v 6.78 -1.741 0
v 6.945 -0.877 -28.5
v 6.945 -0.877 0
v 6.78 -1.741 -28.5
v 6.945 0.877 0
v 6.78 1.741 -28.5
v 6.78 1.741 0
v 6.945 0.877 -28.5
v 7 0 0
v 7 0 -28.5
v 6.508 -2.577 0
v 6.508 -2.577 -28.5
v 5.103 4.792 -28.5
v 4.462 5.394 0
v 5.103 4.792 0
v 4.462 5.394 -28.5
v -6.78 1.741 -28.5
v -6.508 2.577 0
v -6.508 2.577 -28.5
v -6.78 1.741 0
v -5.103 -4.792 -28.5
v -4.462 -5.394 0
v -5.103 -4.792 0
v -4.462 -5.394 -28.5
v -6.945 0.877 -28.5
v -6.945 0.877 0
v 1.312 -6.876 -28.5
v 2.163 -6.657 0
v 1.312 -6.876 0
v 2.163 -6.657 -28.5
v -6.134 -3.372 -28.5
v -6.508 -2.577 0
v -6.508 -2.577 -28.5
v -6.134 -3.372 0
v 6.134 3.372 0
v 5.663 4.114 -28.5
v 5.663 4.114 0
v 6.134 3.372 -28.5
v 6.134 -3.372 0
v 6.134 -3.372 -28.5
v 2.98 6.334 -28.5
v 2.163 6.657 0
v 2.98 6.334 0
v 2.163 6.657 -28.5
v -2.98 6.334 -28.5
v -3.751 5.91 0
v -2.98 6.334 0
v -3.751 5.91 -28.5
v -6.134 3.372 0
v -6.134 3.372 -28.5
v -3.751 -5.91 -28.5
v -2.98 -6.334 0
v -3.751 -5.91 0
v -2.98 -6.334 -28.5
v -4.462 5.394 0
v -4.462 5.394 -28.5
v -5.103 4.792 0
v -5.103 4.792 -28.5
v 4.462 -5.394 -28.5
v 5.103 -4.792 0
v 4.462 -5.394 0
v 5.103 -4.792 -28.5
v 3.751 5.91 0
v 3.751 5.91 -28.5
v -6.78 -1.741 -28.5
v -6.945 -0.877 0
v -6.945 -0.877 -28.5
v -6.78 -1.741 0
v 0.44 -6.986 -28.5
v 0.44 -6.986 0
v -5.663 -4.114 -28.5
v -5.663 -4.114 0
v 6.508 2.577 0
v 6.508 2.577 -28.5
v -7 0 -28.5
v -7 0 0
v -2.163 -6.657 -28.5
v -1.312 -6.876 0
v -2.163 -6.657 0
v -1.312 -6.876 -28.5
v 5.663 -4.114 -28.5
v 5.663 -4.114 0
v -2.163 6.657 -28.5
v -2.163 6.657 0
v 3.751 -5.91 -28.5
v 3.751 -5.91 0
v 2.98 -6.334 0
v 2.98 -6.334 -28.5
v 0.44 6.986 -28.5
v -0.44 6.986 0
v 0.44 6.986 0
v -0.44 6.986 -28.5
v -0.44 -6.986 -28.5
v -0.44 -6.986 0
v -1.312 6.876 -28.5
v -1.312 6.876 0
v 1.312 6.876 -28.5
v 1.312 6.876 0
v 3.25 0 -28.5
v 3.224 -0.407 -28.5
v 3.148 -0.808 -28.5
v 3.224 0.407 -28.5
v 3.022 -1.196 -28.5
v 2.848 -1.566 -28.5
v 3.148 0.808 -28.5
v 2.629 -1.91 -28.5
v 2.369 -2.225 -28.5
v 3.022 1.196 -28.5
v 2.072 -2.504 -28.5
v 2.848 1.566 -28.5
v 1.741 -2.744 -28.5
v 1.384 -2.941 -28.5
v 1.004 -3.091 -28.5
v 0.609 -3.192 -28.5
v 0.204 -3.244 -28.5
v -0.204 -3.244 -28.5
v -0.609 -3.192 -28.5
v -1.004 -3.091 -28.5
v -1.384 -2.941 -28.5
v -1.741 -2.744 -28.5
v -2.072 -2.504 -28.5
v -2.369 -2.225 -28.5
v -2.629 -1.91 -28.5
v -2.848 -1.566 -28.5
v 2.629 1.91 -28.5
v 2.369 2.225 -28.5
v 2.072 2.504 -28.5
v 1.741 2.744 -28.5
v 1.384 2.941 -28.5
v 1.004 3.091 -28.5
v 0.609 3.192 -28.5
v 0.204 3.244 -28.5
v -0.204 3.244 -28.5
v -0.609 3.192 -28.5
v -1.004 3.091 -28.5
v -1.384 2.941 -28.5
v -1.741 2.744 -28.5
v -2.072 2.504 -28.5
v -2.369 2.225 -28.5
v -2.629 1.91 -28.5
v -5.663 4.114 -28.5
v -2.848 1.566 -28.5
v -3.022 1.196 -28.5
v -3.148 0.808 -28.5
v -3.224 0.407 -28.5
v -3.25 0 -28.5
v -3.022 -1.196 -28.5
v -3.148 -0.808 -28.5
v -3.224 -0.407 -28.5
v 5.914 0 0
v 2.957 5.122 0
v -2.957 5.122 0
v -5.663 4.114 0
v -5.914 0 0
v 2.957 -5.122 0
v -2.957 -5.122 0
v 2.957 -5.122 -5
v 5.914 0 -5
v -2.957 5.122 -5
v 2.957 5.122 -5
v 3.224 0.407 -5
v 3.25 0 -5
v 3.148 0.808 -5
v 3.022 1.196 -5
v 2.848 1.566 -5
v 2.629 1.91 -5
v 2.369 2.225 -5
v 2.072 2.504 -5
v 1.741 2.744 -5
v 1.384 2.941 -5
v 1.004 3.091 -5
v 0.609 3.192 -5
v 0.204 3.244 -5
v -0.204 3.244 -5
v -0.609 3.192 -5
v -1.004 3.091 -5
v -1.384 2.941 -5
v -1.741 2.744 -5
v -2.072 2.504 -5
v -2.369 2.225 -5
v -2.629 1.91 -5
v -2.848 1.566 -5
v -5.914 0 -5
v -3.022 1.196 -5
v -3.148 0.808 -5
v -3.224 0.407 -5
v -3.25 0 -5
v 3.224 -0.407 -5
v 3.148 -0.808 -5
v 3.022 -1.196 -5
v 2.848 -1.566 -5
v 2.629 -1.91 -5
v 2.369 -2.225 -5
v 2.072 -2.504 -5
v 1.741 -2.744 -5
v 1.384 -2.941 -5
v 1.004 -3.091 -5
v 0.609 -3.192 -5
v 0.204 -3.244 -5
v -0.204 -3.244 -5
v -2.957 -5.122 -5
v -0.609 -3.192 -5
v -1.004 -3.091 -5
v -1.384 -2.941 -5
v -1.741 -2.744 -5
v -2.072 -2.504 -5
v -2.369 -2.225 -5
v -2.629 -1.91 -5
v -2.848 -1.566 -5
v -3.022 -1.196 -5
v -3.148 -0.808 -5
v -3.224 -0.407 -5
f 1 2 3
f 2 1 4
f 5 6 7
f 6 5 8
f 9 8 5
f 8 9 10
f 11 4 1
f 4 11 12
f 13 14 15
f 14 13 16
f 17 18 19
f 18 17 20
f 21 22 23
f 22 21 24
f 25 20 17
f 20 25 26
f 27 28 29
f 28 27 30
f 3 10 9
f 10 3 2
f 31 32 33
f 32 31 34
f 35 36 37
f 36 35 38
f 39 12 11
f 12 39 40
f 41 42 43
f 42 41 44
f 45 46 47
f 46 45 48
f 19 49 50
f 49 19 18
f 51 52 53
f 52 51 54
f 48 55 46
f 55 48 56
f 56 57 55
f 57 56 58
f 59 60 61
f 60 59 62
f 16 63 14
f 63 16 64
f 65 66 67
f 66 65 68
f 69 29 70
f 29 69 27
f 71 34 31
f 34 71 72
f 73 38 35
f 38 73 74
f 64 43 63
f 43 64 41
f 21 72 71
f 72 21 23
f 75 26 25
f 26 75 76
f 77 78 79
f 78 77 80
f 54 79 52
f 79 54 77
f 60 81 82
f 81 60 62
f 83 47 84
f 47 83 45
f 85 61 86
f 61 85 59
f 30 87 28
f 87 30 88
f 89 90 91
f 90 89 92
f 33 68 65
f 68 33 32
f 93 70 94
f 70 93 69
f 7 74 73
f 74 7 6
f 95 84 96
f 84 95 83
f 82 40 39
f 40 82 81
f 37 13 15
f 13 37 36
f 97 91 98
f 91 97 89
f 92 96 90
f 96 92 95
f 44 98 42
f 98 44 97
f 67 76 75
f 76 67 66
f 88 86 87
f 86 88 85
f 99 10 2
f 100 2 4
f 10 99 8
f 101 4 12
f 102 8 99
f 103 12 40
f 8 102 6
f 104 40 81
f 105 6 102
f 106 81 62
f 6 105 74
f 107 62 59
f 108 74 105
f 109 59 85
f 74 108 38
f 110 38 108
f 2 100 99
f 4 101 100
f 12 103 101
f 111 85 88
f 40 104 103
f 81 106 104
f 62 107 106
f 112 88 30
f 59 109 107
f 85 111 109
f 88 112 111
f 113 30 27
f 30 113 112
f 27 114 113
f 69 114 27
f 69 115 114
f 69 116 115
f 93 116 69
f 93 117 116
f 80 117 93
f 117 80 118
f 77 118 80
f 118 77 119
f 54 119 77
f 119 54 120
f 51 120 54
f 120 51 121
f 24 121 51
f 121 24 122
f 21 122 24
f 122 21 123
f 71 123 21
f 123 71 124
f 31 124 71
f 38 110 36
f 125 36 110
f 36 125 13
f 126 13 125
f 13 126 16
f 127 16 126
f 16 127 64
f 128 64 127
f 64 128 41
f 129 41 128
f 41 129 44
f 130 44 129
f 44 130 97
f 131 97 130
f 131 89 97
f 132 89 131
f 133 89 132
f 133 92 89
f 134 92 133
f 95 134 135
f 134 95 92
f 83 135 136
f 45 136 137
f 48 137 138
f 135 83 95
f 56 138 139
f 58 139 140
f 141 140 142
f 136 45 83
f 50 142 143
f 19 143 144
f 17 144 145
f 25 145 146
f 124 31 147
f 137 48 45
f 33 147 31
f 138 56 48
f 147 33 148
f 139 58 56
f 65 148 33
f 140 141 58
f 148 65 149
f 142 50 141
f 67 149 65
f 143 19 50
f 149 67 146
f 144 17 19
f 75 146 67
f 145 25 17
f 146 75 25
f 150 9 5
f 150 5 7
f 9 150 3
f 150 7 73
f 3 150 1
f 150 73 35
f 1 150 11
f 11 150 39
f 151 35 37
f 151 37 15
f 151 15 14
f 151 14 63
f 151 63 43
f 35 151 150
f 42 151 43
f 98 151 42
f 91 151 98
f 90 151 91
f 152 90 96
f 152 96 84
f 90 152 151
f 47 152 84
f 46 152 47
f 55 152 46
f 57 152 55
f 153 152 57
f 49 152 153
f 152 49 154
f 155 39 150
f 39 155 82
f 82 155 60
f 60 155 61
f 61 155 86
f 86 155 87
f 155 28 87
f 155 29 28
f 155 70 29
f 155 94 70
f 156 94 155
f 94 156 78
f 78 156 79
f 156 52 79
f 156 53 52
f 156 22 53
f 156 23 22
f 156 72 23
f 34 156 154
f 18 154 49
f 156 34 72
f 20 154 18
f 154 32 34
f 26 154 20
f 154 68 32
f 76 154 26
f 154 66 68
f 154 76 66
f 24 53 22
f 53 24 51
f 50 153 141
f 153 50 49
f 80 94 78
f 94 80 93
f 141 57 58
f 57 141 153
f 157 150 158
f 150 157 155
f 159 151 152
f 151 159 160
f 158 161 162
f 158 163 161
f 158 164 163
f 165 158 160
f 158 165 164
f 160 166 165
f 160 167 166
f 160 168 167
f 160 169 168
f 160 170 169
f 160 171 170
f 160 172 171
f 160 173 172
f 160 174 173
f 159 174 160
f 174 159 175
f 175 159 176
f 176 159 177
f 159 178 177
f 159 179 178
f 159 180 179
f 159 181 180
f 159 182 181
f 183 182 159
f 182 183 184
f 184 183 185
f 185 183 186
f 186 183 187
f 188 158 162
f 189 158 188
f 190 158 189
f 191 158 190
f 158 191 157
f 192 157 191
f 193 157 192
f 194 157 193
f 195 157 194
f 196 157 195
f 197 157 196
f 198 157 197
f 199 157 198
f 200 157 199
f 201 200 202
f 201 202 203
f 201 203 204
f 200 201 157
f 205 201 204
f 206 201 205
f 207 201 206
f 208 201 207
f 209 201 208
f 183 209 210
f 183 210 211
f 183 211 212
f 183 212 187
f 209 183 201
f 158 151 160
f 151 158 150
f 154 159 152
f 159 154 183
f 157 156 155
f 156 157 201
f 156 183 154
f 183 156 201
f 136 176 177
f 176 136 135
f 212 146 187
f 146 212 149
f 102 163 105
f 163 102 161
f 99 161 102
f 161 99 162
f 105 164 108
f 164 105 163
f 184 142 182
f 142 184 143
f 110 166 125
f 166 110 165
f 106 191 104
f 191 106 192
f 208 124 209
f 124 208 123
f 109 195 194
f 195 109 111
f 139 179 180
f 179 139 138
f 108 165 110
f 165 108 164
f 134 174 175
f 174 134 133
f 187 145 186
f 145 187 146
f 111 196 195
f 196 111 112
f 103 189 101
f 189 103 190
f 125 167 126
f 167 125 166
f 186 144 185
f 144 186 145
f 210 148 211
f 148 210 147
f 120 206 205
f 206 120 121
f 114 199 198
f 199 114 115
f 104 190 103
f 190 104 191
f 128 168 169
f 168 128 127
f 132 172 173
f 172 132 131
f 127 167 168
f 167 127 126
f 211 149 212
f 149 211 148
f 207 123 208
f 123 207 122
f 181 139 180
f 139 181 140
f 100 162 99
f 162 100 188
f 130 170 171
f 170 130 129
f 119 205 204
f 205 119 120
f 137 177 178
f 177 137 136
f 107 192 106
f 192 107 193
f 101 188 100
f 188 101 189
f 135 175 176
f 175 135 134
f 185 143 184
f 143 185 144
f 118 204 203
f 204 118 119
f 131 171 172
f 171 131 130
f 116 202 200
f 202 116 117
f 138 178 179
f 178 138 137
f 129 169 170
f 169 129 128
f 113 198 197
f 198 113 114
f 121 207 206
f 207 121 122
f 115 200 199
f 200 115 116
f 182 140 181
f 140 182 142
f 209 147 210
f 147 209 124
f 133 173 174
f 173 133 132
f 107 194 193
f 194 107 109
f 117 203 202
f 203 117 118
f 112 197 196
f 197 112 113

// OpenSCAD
$fn = 50;

difference() {
	union() {
		translate(v = [0, 0, -28.5]) {
			cylinder(h = 28.5, r = 7.0);
		}
		#translate(v = [0, 0, -30.0]) {
			cylinder(h = 30, r = 2.875);
		}
	}
	union() {
		translate(v = [0, 0, 0]) {
			rotate(a = [0, 0, 0]) {
				difference() {
					union() {
						translate(v = [0, 0, -5]) {
							linear_extrude(height = 5) {
								polygon(points = [[5.914249999999999, 0.0], [2.957125, 5.1218907443321156], [-2.9571249999999982, 5.1218907443321156], [-5.914249999999999, 7.242867331857232e-16], [-2.9571250000000022, -5.121890744332115], [2.9571249999999956, -5.121890744332118]]);
							}
						}
					}
					union();
				}
			}
		}
		#translate(v = [0, 0, -100.0]) {
			cylinder(h = 200, r = 3.25);
		}
	}
}
